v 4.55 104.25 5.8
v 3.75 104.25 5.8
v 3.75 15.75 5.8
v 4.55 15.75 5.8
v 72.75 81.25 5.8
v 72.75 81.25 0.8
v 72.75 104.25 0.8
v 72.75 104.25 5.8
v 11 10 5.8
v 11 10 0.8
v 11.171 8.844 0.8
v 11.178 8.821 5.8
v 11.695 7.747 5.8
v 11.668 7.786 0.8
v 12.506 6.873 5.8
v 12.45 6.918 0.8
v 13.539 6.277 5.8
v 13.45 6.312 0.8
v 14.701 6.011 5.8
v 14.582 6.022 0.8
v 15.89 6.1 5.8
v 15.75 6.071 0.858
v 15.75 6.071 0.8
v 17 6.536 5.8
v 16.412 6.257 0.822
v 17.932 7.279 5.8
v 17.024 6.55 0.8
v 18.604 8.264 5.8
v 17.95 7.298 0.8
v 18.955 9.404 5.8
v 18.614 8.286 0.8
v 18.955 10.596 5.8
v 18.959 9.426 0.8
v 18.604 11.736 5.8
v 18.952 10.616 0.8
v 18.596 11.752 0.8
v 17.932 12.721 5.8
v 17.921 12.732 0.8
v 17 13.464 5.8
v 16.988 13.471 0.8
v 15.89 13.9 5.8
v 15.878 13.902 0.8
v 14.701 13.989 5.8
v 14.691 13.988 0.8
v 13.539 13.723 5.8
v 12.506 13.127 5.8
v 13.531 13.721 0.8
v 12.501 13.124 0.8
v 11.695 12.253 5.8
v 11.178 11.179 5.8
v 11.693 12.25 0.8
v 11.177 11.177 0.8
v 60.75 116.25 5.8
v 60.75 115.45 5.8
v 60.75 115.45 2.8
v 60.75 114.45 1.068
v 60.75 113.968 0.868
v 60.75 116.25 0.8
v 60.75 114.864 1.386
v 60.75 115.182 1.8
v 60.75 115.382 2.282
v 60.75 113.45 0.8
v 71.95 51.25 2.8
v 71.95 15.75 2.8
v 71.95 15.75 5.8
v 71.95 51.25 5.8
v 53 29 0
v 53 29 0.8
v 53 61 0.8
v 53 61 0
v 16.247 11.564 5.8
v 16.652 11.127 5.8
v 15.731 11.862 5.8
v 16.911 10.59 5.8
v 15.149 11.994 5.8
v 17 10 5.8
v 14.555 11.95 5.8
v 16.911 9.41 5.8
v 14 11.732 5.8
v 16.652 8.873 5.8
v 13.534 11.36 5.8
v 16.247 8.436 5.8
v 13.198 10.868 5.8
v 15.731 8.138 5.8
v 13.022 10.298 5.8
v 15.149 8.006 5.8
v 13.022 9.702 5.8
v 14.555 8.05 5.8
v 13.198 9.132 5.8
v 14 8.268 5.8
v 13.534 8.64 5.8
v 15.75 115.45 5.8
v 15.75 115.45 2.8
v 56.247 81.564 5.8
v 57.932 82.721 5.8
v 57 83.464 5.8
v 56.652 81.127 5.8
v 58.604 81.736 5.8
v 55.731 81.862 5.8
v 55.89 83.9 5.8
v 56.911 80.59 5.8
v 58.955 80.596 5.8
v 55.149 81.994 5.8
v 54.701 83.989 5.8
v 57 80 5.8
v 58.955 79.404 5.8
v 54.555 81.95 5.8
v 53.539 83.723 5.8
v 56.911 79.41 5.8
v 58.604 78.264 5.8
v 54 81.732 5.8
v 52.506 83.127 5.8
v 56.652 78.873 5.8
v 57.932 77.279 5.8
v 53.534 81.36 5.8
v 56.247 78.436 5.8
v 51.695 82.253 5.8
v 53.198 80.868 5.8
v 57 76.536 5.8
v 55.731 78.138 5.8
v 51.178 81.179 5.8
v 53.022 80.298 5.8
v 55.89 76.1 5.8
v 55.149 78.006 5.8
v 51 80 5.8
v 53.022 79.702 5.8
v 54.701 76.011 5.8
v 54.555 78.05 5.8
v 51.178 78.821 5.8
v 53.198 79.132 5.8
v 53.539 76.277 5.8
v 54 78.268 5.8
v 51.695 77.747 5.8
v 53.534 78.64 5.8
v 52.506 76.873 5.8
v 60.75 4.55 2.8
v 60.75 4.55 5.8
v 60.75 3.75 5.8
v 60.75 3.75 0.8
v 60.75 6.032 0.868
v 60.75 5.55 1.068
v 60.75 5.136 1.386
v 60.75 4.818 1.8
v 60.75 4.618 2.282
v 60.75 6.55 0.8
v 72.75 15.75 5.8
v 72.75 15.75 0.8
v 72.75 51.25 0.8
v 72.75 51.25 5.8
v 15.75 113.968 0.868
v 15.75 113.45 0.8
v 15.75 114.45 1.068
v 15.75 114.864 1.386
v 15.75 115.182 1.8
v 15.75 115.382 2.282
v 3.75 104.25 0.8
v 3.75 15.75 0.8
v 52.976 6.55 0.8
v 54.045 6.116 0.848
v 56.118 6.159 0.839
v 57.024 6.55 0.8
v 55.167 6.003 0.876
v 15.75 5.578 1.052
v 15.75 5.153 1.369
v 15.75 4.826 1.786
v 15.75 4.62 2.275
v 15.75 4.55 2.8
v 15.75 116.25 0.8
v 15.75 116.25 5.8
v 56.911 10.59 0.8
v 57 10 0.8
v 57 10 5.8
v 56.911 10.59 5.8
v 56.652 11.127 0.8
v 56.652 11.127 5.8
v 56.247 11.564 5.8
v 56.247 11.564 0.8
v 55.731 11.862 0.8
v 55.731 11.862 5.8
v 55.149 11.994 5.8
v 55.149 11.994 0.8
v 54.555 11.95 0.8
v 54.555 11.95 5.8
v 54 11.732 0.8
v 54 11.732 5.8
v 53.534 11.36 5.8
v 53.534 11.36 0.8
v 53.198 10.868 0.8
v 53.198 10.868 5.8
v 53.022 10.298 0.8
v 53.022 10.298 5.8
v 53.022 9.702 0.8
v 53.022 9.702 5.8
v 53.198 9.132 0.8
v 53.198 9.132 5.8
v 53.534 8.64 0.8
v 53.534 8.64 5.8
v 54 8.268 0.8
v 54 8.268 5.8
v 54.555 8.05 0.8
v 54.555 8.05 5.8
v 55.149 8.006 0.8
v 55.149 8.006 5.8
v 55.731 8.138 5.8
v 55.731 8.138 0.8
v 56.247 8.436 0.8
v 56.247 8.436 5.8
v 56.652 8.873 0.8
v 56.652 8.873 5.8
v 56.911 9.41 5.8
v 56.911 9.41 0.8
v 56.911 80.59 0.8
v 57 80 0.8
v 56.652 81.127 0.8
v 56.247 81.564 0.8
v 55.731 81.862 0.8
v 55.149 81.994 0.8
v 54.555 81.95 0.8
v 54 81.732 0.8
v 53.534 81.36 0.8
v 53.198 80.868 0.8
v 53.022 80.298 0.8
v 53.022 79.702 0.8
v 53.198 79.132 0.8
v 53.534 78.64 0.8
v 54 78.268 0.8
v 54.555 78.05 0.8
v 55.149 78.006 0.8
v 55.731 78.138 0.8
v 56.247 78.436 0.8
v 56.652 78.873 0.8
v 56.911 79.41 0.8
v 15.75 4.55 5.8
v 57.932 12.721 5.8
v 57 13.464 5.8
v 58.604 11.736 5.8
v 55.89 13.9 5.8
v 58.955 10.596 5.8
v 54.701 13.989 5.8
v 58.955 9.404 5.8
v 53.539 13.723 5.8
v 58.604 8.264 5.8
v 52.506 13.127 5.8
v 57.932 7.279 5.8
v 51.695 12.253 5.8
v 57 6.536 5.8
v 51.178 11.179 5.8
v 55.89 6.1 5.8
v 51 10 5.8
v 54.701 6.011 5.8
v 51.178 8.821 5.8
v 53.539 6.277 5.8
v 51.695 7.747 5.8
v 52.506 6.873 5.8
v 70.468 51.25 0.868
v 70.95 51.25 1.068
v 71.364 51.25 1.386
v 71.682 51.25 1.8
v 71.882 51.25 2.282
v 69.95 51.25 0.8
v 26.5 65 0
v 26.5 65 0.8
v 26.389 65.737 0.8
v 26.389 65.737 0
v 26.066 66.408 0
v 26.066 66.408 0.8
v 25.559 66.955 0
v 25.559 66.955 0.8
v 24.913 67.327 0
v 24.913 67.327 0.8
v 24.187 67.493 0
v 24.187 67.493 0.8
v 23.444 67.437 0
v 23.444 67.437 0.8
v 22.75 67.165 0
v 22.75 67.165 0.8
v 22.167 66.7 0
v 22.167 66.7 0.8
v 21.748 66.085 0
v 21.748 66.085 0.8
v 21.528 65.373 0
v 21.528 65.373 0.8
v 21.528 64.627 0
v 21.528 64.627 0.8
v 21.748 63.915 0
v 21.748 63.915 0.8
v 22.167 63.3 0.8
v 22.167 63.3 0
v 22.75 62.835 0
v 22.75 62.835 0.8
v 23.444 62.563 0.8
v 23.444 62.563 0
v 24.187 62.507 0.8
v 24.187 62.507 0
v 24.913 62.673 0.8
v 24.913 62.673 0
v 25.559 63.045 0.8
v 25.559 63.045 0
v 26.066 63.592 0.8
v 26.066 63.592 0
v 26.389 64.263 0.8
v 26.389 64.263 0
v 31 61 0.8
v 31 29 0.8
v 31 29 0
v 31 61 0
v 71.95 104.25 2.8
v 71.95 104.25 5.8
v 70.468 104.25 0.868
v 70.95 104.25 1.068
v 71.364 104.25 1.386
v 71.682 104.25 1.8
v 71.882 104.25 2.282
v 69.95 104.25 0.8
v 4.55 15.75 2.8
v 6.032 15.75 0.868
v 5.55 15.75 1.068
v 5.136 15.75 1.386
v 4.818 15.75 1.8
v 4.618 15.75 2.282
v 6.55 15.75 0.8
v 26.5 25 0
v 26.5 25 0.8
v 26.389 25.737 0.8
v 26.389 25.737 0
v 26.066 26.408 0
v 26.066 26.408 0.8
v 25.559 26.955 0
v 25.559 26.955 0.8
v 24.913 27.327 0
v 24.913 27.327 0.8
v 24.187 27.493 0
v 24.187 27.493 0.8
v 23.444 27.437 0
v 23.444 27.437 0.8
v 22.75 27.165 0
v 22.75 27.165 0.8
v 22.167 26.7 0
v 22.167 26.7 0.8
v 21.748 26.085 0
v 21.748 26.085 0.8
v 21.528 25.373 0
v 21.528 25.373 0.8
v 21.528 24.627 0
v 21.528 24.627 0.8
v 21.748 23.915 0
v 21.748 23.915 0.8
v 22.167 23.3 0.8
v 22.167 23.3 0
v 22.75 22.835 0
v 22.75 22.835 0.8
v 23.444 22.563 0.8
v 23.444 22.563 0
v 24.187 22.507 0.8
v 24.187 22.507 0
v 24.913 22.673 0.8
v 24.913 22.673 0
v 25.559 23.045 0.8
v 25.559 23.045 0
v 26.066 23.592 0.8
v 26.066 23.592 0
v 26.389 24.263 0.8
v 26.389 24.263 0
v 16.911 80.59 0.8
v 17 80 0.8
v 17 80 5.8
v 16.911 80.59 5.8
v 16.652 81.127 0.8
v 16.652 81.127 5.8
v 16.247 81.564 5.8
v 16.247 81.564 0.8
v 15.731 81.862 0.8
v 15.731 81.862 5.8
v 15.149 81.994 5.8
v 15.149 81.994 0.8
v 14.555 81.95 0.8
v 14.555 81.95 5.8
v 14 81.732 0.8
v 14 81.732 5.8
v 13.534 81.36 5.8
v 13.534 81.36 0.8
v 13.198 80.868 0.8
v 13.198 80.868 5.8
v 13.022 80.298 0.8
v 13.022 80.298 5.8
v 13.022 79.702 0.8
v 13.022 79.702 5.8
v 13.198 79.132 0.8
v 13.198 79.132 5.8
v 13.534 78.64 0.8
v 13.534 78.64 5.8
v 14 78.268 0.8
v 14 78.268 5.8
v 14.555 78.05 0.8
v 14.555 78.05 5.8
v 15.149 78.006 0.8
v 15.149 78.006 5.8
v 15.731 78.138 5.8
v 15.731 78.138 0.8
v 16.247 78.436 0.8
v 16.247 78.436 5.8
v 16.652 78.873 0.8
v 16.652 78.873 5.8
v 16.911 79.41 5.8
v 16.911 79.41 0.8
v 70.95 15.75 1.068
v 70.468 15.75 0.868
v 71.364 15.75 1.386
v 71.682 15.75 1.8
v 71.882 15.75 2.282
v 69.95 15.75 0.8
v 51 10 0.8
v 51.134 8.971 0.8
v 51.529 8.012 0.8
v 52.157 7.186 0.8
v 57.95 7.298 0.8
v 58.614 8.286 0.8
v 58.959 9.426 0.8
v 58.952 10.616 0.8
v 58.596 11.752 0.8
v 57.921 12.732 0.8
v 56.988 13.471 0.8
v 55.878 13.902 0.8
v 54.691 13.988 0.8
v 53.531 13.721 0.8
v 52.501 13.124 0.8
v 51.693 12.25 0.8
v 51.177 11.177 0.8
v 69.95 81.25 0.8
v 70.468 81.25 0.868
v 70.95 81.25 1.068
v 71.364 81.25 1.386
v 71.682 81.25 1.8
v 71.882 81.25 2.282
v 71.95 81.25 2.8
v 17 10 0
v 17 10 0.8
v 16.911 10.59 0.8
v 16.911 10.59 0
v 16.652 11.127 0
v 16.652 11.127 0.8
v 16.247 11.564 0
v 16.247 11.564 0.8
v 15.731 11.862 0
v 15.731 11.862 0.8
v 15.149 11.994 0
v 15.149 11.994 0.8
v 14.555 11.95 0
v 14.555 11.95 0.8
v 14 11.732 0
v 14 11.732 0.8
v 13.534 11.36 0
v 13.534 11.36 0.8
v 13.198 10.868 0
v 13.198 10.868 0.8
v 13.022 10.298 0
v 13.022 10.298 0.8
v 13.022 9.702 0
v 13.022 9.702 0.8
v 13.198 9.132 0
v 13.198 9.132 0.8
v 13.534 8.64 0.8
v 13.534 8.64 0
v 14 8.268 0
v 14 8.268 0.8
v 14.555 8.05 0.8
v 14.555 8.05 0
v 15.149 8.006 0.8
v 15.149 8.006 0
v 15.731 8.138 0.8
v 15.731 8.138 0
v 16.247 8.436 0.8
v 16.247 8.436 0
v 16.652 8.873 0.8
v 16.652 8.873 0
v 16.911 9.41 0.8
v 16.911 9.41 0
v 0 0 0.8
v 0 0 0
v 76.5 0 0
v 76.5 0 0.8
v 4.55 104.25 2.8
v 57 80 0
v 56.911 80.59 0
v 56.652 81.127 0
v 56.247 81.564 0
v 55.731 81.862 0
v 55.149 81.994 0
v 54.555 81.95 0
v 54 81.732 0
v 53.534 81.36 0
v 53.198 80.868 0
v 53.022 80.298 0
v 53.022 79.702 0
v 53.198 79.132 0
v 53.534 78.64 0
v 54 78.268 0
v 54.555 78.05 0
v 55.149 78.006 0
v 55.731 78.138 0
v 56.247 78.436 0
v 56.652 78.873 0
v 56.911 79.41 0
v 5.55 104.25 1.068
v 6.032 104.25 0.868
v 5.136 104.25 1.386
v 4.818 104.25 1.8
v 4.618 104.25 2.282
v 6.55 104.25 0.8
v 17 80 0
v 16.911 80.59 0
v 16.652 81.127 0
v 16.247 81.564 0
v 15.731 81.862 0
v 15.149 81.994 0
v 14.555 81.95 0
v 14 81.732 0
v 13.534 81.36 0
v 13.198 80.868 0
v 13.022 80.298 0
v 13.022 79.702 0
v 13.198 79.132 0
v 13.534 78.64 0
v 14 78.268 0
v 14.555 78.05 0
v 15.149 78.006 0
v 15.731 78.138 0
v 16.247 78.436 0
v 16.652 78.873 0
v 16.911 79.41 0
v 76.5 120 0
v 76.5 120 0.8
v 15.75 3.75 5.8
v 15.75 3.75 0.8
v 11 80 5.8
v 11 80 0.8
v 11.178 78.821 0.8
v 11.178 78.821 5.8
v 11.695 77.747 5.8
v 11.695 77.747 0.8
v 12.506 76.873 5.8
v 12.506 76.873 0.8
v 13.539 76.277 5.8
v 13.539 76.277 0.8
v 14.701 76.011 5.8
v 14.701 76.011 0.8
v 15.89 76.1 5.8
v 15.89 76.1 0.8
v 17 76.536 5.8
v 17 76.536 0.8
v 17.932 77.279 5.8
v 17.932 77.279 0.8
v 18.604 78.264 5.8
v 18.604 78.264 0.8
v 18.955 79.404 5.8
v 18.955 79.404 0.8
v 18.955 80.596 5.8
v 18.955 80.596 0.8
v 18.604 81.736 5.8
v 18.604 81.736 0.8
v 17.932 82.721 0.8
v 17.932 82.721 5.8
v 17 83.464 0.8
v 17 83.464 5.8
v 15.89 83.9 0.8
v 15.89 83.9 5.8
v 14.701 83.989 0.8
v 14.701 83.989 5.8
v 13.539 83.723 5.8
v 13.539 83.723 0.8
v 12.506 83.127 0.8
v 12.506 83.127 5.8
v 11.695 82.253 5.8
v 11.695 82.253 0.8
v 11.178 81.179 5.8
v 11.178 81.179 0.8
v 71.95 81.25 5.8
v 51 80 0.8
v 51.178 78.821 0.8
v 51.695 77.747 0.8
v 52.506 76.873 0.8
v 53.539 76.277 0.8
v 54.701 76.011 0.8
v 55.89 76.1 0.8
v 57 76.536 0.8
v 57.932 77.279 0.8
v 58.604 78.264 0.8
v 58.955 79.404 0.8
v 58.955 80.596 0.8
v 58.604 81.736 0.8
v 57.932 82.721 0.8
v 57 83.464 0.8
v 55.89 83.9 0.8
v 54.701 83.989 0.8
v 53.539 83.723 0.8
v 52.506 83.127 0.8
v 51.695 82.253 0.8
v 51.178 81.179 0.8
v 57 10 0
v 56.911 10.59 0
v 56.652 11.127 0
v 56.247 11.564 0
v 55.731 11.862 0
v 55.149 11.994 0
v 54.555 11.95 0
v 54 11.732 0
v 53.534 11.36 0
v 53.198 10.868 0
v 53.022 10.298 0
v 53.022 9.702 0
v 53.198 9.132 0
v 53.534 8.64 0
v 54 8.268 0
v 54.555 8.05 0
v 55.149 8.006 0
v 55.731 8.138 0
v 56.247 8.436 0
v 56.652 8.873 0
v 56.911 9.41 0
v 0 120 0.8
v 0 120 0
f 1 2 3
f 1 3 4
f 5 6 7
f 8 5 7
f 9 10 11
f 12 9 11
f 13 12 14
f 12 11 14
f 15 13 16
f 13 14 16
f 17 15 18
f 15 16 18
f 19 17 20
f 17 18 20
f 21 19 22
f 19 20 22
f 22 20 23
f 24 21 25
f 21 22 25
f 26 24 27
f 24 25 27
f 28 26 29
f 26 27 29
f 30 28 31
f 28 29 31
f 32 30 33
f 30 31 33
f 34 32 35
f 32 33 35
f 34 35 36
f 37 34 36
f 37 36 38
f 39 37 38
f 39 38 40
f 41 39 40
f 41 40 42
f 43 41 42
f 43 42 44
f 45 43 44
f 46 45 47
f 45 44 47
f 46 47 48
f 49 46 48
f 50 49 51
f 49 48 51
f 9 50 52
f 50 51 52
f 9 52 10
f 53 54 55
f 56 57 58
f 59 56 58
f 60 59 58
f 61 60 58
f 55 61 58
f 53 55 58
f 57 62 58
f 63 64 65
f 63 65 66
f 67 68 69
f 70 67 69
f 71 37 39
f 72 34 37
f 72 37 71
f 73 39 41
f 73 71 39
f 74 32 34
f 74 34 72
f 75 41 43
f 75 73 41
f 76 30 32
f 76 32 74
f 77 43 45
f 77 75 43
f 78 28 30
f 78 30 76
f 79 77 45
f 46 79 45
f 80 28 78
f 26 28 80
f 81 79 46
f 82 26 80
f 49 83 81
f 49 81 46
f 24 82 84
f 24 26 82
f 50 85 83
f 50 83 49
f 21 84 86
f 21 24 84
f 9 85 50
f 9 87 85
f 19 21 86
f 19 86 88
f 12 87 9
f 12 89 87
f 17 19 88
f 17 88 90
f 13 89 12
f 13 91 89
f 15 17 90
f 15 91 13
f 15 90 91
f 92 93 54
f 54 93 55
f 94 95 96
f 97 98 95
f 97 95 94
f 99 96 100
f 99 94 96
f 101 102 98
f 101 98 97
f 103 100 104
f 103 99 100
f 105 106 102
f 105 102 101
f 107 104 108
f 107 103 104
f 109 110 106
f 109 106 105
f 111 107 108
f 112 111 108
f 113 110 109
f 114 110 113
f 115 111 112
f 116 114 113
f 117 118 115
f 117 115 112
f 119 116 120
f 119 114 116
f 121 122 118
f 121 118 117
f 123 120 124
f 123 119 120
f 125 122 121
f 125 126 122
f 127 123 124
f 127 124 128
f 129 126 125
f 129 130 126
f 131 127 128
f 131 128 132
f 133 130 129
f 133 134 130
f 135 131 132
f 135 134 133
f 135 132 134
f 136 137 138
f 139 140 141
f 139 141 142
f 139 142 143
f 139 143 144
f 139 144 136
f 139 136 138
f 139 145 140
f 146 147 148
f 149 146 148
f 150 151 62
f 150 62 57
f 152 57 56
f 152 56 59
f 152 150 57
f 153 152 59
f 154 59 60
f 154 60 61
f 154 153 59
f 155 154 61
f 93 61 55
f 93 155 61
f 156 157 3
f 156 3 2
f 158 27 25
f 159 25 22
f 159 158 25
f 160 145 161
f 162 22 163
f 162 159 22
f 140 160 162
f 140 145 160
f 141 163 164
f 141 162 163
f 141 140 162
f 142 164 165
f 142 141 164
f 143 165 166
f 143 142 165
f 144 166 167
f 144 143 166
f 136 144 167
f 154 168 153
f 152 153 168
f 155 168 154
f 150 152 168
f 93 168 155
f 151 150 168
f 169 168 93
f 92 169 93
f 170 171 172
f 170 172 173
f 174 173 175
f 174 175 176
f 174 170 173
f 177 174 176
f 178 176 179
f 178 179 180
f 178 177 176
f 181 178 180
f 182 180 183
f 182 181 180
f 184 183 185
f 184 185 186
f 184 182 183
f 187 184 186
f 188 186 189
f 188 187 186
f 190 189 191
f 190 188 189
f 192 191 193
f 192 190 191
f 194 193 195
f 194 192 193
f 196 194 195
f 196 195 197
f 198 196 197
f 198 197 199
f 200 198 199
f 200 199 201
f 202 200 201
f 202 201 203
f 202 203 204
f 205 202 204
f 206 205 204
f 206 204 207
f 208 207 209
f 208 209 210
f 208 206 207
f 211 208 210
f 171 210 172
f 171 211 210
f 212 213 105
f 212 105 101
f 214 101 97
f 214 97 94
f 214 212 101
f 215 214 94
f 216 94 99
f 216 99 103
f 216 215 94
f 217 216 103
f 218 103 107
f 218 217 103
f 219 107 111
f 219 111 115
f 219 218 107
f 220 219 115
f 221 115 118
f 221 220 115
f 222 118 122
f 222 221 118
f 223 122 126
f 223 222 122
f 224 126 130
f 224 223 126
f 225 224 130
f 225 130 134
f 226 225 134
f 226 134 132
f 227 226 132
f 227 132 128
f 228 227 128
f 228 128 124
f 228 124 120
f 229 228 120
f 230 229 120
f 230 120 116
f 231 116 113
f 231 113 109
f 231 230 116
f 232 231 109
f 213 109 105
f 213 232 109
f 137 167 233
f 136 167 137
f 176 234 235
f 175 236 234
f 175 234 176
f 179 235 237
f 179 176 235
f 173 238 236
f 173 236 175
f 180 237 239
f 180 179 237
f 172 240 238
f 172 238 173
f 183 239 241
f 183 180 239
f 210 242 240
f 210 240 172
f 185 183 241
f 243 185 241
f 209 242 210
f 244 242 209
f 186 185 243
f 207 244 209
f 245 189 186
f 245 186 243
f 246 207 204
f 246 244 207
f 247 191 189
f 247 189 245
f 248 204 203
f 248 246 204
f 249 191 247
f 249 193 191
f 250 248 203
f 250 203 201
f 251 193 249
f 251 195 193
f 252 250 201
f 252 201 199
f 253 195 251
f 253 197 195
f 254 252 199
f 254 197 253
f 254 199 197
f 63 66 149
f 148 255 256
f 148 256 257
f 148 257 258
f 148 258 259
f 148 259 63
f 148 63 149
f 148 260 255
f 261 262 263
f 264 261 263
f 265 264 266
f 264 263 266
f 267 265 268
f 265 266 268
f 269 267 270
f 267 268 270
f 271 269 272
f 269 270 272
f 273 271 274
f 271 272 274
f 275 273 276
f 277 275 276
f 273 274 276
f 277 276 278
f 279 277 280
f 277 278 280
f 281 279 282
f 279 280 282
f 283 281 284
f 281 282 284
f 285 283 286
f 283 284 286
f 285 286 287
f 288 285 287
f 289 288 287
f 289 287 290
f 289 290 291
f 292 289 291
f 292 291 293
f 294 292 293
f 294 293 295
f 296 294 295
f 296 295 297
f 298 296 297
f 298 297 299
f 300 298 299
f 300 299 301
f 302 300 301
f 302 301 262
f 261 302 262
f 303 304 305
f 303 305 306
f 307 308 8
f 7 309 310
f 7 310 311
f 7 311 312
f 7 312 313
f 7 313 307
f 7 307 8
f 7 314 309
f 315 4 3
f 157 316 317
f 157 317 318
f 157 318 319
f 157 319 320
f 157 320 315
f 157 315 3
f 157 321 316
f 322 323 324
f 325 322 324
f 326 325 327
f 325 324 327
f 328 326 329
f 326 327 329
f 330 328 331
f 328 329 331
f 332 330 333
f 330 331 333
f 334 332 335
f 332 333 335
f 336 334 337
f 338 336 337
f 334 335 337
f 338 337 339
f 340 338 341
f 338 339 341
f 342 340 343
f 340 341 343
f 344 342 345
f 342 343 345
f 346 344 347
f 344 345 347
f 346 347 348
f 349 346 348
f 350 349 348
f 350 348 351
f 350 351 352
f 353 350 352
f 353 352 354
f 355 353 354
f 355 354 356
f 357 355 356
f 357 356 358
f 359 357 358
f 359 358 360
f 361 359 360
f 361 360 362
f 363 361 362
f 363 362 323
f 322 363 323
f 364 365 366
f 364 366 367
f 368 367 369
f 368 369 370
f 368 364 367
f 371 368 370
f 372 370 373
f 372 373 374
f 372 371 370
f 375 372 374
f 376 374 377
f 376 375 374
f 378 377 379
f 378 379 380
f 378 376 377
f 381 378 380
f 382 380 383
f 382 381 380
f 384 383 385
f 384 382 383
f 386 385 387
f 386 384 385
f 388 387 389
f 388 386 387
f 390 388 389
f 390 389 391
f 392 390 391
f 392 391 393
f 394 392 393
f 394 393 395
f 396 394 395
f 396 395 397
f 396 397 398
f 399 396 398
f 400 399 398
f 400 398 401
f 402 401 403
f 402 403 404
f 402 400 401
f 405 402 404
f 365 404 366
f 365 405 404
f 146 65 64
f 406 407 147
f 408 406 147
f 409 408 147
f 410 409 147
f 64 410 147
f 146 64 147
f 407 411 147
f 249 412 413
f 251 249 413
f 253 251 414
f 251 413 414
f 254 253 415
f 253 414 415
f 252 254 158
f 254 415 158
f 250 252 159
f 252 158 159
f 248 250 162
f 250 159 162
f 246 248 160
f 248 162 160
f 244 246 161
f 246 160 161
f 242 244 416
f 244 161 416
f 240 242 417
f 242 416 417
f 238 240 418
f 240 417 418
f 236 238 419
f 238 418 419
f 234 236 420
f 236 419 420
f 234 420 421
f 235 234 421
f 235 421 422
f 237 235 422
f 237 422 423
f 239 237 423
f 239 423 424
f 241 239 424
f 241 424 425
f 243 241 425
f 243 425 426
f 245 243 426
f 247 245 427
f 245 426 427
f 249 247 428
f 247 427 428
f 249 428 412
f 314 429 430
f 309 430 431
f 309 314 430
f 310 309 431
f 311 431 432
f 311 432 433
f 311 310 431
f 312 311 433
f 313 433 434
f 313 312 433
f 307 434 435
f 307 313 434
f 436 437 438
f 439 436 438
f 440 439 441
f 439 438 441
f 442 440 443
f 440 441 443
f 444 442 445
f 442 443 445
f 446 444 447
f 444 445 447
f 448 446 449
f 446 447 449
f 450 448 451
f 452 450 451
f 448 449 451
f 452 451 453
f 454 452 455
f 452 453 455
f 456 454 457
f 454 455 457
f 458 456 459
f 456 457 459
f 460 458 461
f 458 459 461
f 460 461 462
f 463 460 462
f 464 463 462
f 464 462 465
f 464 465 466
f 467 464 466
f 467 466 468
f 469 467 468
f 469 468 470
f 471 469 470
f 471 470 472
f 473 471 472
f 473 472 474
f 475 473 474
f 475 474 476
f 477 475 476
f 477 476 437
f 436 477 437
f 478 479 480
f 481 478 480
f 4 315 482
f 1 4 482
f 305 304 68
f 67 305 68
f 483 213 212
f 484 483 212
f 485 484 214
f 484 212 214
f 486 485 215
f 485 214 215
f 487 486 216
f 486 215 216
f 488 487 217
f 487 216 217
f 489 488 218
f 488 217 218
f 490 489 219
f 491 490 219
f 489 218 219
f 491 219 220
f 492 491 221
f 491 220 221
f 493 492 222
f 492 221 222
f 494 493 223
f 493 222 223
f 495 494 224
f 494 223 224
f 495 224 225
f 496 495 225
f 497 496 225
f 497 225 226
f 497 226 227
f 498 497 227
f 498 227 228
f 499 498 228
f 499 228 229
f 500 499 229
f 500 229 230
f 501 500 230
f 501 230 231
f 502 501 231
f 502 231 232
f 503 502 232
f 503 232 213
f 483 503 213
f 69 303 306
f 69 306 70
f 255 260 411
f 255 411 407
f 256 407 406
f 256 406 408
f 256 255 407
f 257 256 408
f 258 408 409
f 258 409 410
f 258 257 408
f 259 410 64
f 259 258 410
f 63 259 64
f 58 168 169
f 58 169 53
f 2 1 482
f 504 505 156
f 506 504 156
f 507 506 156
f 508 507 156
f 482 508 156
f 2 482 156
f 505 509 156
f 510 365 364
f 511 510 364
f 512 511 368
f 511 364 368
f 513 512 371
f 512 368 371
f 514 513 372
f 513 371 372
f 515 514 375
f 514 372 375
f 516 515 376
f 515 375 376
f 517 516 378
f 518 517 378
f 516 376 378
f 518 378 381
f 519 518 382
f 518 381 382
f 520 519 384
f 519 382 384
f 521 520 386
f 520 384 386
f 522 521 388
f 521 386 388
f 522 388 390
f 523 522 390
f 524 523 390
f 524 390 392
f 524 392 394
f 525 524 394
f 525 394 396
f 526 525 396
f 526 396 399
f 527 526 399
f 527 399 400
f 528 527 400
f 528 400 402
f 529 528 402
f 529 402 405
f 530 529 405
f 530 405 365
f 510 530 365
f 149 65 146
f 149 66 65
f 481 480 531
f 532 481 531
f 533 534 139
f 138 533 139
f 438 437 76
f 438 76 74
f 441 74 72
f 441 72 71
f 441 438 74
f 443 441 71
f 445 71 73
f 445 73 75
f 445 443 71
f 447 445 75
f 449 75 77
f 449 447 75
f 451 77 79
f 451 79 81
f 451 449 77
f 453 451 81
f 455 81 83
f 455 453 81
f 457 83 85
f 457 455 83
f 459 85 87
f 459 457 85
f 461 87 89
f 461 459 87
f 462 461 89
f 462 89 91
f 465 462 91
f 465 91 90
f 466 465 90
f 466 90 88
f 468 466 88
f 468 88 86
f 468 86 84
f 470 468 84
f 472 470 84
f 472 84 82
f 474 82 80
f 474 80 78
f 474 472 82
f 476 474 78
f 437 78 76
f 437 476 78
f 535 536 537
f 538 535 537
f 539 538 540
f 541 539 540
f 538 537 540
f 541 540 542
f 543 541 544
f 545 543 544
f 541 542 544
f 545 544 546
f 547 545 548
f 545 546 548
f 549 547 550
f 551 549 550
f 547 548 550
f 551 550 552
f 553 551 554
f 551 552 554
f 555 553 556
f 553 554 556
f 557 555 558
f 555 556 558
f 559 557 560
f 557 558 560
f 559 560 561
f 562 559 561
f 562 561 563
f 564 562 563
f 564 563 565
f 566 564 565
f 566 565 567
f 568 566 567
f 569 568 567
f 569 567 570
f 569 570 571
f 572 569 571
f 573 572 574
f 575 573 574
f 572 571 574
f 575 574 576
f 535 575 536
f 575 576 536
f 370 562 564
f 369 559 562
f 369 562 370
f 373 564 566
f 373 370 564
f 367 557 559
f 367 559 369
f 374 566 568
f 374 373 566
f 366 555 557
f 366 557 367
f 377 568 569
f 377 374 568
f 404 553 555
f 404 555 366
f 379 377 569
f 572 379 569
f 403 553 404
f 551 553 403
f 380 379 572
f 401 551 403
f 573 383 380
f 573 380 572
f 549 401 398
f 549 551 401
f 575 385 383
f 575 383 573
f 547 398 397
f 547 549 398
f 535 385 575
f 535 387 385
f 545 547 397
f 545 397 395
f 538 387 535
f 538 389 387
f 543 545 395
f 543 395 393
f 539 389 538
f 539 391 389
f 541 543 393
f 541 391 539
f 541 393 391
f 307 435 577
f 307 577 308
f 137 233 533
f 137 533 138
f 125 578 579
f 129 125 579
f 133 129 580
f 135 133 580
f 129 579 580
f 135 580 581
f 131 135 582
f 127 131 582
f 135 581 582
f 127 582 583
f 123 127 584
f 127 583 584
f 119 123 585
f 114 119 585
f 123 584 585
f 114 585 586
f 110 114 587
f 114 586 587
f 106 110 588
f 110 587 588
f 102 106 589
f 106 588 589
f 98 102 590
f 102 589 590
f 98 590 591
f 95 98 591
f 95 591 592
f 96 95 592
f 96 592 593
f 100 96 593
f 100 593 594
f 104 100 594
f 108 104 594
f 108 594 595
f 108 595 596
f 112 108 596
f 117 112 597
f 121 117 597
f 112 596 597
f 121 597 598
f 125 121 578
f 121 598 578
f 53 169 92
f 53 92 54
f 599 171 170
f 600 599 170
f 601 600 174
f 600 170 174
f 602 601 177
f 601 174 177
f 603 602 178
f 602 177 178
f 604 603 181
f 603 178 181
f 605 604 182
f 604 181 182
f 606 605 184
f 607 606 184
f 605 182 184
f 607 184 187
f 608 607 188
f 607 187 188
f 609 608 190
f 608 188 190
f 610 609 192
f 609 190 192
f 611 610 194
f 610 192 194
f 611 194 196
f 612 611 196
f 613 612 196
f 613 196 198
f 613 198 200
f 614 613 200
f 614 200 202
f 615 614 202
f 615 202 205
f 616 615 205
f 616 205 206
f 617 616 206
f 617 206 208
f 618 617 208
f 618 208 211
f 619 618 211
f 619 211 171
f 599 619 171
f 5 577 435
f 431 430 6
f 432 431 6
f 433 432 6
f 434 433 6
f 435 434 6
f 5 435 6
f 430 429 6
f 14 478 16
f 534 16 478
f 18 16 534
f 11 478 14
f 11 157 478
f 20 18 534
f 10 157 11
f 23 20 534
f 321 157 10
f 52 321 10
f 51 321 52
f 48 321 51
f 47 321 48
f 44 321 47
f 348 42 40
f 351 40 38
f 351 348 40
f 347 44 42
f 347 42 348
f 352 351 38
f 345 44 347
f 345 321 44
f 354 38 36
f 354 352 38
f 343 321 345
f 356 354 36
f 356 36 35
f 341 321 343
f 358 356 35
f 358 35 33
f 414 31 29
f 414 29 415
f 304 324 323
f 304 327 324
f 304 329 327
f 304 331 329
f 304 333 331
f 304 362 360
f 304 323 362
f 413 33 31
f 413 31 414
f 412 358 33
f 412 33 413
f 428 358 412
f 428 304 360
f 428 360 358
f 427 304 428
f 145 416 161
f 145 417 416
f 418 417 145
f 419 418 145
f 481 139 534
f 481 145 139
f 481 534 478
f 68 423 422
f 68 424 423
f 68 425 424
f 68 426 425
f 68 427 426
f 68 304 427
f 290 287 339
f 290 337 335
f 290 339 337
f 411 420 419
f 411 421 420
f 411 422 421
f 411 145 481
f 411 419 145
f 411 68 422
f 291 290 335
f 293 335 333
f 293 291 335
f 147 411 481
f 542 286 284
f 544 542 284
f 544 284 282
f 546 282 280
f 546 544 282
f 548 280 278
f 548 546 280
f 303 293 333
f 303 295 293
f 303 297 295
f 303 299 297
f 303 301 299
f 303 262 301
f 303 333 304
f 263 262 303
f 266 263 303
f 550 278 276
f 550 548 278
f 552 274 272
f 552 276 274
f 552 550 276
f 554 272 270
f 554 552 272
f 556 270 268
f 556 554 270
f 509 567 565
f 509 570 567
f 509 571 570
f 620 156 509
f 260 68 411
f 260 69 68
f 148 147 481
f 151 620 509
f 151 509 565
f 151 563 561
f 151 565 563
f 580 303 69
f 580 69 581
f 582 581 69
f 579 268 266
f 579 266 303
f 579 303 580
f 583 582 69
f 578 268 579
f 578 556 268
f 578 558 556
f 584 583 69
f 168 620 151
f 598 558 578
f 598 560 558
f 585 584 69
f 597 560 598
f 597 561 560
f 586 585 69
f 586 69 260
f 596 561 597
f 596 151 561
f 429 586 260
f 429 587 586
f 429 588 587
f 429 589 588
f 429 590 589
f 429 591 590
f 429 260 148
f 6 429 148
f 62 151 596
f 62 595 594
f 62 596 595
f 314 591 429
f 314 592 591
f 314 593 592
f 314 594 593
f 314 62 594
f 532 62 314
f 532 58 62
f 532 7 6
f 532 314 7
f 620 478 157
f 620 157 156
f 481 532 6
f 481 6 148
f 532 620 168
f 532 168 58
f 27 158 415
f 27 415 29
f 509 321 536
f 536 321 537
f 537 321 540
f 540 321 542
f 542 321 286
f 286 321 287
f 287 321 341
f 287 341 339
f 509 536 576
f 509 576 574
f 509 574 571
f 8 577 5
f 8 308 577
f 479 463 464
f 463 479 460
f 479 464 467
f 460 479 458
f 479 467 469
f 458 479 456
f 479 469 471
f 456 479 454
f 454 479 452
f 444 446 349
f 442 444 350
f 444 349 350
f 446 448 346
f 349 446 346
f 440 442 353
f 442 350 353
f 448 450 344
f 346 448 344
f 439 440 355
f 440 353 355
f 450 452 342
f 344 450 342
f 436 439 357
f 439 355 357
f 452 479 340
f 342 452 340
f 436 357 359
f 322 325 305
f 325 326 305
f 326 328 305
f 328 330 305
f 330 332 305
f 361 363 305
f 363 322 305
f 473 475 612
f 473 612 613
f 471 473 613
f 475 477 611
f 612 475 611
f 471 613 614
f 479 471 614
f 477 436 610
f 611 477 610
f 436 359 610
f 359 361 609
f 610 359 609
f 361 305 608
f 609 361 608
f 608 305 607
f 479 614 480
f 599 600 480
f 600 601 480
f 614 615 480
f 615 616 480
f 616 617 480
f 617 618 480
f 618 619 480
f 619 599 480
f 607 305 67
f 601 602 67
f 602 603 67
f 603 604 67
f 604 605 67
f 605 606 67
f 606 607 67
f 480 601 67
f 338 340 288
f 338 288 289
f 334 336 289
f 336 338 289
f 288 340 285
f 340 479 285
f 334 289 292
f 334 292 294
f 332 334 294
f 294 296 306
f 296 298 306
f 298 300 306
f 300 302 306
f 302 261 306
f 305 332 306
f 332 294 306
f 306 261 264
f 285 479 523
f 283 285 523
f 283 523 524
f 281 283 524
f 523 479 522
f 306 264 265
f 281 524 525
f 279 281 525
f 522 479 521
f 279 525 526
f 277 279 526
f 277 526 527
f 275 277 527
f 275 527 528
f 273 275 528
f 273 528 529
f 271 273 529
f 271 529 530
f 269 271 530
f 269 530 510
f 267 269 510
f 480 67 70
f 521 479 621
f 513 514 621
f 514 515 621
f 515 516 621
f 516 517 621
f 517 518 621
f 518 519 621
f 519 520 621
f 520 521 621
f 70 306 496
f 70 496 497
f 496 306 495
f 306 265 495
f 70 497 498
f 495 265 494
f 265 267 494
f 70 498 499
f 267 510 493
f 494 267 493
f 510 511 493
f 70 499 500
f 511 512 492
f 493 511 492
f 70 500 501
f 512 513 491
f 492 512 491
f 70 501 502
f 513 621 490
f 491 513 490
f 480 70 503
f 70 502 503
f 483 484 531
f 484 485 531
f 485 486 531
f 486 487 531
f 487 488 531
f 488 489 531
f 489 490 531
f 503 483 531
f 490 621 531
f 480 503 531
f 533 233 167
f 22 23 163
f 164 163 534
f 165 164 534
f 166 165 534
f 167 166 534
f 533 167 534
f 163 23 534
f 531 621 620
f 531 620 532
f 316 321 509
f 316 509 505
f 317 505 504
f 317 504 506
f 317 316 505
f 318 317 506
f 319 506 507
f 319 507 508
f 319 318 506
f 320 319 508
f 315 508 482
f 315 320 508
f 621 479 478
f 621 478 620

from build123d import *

# Parameters (mm, degrees)
SKETCH_1_W          = 76.5
SKETCH_1_H          = 120
EXTRUDE_1_DEPTH     = 0.8
SKETCH_5_R          = 2.5
CUT_EXTRUDE_2_DEPTH = 143.31264877
SKETCH_7_R          = 4
SKETCH_7_R_2        = 2
EXTRUDE_2_DEPTH     = 5
SKETCH_8_W          = 22
SKETCH_8_H          = 32
CUT_EXTRUDE_4_DEPTH = 143.398209258
SKETCH_9_R          = 2
CUT_EXTRUDE_5_DEPTH = 143.398209258
SKETCH_10_W         = 69
SKETCH_10_H         = 112.5
SKETCH_10_W_2       = 67.4
SKETCH_10_H_2       = 110.9
EXTRUDE_4_DEPTH     = 5
SKETCH_11_W         = 0.8
SKETCH_11_H         = 30
CUT_EXTRUDE_6_DEPTH = 5
FILLET_1_R          = 2


with BuildPart() as part:
    # ｽｹｯﾁ1 → ﾎﾞｽ - 押し出し1 (new body)
    with BuildSketch(Plane.XY):
        with Locations((38.25, 60)):
            Rectangle(SKETCH_1_W, SKETCH_1_H)
    extrude(amount=EXTRUDE_1_DEPTH)

    # ｽｹｯﾁ5 → ｶｯﾄ - 押し出し2 (cut, through all)
    with BuildSketch(Plane.XY.offset(0.8)):
        with Locations((24, 65)):
            Circle(SKETCH_5_R)
        with Locations((24, 25)):
            Circle(SKETCH_5_R)
    extrude(amount=-CUT_EXTRUDE_2_DEPTH, mode=Mode.SUBTRACT)

    # ｽｹｯﾁ7 → ﾎﾞｽ - 押し出し2 (add)
    # profile 1 of 4: a face of its own
    with BuildSketch(Plane.XY.offset(0.8)):
        with Locations(Location((55, 80, 0), (0, 0, 180))):
            Circle(SKETCH_7_R)
        with Locations((55, 80)):
            Circle(SKETCH_7_R_2, mode=Mode.SUBTRACT)
    # profile 2 of 4: a face of its own
    with BuildSketch(Plane.XY.offset(0.8)):
        with Locations(Location((15, 80, 0), (0, 0, 180))):
            Circle(SKETCH_7_R)
        with Locations((15, 80)):
            Circle(SKETCH_7_R_2, mode=Mode.SUBTRACT)
    # profile 3 of 4: a face of its own
    with BuildSketch(Plane.XY.offset(0.8)):
        with Locations(Location((55, 10, 0), (0, 0, 180))):
            Circle(SKETCH_7_R)
        with Locations((55, 10)):
            Circle(SKETCH_7_R_2, mode=Mode.SUBTRACT)
    # profile 4 of 4: a face of its own
    with BuildSketch(Plane.XY.offset(0.8)):
        with Locations(Location((15, 10, 0), (0, 0, 180))):
            Circle(SKETCH_7_R)
        with Locations((15, 10)):
            Circle(SKETCH_7_R_2, mode=Mode.SUBTRACT)
    extrude(amount=EXTRUDE_2_DEPTH)

    # ｽｹｯﾁ8 → ｶｯﾄ - 押し出し4 (cut, through all)
    with BuildSketch(Plane.XY.offset(0.8)):
        with Locations((42, 45)):
            Rectangle(SKETCH_8_W, SKETCH_8_H)
    extrude(amount=-CUT_EXTRUDE_4_DEPTH, mode=Mode.SUBTRACT)

    # ｽｹｯﾁ9 → ｶｯﾄ - 押し出し5 (cut, through all)
    with BuildSketch(Plane.XY.offset(0.8)):
        with Locations((15, 80)):
            Circle(SKETCH_9_R)
        with Locations((55, 80)):
            Circle(SKETCH_9_R)
        with Locations((55, 10)):
            Circle(SKETCH_9_R)
        with Locations((15, 10)):
            Circle(SKETCH_9_R)
    extrude(amount=-CUT_EXTRUDE_5_DEPTH, mode=Mode.SUBTRACT)

    # ｽｹｯﾁ10 → ﾎﾞｽ - 押し出し4 (add)
    with BuildSketch(Plane.XY.offset(0.8)):
        with Locations((38.25, 60)):
            Rectangle(SKETCH_10_W, SKETCH_10_H)
        with Locations((38.25, 60)):
            Rectangle(SKETCH_10_W_2, SKETCH_10_H_2, mode=Mode.SUBTRACT)
    extrude(amount=EXTRUDE_4_DEPTH)

    # ｽｹｯﾁ11 → ｶｯﾄ - 押し出し6 (cut)
    with BuildSketch(Plane.XY.offset(5.8)):
        with Locations((72.35, 66.25)):
            Rectangle(SKETCH_11_W, SKETCH_11_H)
        Polygon((3.75, 116.25), (15.75, 116.25), (15.75, 115.45), (4.55, 115.45), (4.55, 104.25), (3.75, 104.25), align=None)
        Polygon((72.75, 104.25), (72.75, 116.25), (60.75, 116.25), (60.75, 115.45), (71.95, 115.45), (71.95, 104.25), align=None)
        Polygon((72.75, 3.75), (72.75, 15.75), (71.95, 15.75), (71.95, 4.55), (60.75, 4.55), (60.75, 3.75), align=None)
        Polygon((3.75, 3.75), (15.75, 3.75), (15.75, 4.55), (4.55, 4.55), (4.55, 15.75), (3.75, 15.75), align=None)
    extrude(amount=-CUT_EXTRUDE_6_DEPTH, mode=Mode.SUBTRACT)

    # ﾌｨﾚｯﾄ1
    # the kernel refuses this fillet: 2 mm, written as the material it adds along each edge
    with BuildSketch(Plane(origin=(60.75, 4.55, 0.8), x_dir=(0, 1, 0), z_dir=(-1, 0, 0)), Plane(origin=(15.75, 115.45, 0.8), x_dir=(0, -1, 0), z_dir=(1, 0, 0))) as fillet_1_piece_1:
        with BuildLine():
            CenterArc((FILLET_1_R, -FILLET_1_R), FILLET_1_R, 90, 90)
            Line((0, -FILLET_1_R), (0, 0))
            Line((0, 0), (FILLET_1_R, 0))
        make_face()
    extrude(amount=45)
    with BuildSketch(Plane(origin=(4.55, 15.75, 0.8), x_dir=(1, 0, 0), z_dir=(0, 1, 0))) as fillet_1_piece_2:
        with BuildLine():
            CenterArc((FILLET_1_R, -FILLET_1_R), FILLET_1_R, 90, 90)
            Line((0, -FILLET_1_R), (0, 0))
            Line((0, 0), (FILLET_1_R, 0))
        make_face()
    extrude(amount=88.5)
    with BuildSketch(Plane(origin=(71.95, 51.25, 0.8), x_dir=(-1, 0, 0), z_dir=(0, -1, 0))) as fillet_1_piece_3:
        with BuildLine():
            CenterArc((FILLET_1_R, -FILLET_1_R), FILLET_1_R, 90, 90)
            Line((0, -FILLET_1_R), (0, 0))
            Line((0, 0), (FILLET_1_R, 0))
        make_face()
    extrude(amount=35.5)
    with BuildSketch(Plane(origin=(71.95, 104.25, 0.8), x_dir=(-1, 0, 0), z_dir=(0, -1, 0))) as fillet_1_piece_4:
        with BuildLine():
            CenterArc((FILLET_1_R, -FILLET_1_R), FILLET_1_R, 90, 90)
            Line((0, -FILLET_1_R), (0, 0))
            Line((0, 0), (FILLET_1_R, 0))
        make_face()
    extrude(amount=23)


solid = part.part
